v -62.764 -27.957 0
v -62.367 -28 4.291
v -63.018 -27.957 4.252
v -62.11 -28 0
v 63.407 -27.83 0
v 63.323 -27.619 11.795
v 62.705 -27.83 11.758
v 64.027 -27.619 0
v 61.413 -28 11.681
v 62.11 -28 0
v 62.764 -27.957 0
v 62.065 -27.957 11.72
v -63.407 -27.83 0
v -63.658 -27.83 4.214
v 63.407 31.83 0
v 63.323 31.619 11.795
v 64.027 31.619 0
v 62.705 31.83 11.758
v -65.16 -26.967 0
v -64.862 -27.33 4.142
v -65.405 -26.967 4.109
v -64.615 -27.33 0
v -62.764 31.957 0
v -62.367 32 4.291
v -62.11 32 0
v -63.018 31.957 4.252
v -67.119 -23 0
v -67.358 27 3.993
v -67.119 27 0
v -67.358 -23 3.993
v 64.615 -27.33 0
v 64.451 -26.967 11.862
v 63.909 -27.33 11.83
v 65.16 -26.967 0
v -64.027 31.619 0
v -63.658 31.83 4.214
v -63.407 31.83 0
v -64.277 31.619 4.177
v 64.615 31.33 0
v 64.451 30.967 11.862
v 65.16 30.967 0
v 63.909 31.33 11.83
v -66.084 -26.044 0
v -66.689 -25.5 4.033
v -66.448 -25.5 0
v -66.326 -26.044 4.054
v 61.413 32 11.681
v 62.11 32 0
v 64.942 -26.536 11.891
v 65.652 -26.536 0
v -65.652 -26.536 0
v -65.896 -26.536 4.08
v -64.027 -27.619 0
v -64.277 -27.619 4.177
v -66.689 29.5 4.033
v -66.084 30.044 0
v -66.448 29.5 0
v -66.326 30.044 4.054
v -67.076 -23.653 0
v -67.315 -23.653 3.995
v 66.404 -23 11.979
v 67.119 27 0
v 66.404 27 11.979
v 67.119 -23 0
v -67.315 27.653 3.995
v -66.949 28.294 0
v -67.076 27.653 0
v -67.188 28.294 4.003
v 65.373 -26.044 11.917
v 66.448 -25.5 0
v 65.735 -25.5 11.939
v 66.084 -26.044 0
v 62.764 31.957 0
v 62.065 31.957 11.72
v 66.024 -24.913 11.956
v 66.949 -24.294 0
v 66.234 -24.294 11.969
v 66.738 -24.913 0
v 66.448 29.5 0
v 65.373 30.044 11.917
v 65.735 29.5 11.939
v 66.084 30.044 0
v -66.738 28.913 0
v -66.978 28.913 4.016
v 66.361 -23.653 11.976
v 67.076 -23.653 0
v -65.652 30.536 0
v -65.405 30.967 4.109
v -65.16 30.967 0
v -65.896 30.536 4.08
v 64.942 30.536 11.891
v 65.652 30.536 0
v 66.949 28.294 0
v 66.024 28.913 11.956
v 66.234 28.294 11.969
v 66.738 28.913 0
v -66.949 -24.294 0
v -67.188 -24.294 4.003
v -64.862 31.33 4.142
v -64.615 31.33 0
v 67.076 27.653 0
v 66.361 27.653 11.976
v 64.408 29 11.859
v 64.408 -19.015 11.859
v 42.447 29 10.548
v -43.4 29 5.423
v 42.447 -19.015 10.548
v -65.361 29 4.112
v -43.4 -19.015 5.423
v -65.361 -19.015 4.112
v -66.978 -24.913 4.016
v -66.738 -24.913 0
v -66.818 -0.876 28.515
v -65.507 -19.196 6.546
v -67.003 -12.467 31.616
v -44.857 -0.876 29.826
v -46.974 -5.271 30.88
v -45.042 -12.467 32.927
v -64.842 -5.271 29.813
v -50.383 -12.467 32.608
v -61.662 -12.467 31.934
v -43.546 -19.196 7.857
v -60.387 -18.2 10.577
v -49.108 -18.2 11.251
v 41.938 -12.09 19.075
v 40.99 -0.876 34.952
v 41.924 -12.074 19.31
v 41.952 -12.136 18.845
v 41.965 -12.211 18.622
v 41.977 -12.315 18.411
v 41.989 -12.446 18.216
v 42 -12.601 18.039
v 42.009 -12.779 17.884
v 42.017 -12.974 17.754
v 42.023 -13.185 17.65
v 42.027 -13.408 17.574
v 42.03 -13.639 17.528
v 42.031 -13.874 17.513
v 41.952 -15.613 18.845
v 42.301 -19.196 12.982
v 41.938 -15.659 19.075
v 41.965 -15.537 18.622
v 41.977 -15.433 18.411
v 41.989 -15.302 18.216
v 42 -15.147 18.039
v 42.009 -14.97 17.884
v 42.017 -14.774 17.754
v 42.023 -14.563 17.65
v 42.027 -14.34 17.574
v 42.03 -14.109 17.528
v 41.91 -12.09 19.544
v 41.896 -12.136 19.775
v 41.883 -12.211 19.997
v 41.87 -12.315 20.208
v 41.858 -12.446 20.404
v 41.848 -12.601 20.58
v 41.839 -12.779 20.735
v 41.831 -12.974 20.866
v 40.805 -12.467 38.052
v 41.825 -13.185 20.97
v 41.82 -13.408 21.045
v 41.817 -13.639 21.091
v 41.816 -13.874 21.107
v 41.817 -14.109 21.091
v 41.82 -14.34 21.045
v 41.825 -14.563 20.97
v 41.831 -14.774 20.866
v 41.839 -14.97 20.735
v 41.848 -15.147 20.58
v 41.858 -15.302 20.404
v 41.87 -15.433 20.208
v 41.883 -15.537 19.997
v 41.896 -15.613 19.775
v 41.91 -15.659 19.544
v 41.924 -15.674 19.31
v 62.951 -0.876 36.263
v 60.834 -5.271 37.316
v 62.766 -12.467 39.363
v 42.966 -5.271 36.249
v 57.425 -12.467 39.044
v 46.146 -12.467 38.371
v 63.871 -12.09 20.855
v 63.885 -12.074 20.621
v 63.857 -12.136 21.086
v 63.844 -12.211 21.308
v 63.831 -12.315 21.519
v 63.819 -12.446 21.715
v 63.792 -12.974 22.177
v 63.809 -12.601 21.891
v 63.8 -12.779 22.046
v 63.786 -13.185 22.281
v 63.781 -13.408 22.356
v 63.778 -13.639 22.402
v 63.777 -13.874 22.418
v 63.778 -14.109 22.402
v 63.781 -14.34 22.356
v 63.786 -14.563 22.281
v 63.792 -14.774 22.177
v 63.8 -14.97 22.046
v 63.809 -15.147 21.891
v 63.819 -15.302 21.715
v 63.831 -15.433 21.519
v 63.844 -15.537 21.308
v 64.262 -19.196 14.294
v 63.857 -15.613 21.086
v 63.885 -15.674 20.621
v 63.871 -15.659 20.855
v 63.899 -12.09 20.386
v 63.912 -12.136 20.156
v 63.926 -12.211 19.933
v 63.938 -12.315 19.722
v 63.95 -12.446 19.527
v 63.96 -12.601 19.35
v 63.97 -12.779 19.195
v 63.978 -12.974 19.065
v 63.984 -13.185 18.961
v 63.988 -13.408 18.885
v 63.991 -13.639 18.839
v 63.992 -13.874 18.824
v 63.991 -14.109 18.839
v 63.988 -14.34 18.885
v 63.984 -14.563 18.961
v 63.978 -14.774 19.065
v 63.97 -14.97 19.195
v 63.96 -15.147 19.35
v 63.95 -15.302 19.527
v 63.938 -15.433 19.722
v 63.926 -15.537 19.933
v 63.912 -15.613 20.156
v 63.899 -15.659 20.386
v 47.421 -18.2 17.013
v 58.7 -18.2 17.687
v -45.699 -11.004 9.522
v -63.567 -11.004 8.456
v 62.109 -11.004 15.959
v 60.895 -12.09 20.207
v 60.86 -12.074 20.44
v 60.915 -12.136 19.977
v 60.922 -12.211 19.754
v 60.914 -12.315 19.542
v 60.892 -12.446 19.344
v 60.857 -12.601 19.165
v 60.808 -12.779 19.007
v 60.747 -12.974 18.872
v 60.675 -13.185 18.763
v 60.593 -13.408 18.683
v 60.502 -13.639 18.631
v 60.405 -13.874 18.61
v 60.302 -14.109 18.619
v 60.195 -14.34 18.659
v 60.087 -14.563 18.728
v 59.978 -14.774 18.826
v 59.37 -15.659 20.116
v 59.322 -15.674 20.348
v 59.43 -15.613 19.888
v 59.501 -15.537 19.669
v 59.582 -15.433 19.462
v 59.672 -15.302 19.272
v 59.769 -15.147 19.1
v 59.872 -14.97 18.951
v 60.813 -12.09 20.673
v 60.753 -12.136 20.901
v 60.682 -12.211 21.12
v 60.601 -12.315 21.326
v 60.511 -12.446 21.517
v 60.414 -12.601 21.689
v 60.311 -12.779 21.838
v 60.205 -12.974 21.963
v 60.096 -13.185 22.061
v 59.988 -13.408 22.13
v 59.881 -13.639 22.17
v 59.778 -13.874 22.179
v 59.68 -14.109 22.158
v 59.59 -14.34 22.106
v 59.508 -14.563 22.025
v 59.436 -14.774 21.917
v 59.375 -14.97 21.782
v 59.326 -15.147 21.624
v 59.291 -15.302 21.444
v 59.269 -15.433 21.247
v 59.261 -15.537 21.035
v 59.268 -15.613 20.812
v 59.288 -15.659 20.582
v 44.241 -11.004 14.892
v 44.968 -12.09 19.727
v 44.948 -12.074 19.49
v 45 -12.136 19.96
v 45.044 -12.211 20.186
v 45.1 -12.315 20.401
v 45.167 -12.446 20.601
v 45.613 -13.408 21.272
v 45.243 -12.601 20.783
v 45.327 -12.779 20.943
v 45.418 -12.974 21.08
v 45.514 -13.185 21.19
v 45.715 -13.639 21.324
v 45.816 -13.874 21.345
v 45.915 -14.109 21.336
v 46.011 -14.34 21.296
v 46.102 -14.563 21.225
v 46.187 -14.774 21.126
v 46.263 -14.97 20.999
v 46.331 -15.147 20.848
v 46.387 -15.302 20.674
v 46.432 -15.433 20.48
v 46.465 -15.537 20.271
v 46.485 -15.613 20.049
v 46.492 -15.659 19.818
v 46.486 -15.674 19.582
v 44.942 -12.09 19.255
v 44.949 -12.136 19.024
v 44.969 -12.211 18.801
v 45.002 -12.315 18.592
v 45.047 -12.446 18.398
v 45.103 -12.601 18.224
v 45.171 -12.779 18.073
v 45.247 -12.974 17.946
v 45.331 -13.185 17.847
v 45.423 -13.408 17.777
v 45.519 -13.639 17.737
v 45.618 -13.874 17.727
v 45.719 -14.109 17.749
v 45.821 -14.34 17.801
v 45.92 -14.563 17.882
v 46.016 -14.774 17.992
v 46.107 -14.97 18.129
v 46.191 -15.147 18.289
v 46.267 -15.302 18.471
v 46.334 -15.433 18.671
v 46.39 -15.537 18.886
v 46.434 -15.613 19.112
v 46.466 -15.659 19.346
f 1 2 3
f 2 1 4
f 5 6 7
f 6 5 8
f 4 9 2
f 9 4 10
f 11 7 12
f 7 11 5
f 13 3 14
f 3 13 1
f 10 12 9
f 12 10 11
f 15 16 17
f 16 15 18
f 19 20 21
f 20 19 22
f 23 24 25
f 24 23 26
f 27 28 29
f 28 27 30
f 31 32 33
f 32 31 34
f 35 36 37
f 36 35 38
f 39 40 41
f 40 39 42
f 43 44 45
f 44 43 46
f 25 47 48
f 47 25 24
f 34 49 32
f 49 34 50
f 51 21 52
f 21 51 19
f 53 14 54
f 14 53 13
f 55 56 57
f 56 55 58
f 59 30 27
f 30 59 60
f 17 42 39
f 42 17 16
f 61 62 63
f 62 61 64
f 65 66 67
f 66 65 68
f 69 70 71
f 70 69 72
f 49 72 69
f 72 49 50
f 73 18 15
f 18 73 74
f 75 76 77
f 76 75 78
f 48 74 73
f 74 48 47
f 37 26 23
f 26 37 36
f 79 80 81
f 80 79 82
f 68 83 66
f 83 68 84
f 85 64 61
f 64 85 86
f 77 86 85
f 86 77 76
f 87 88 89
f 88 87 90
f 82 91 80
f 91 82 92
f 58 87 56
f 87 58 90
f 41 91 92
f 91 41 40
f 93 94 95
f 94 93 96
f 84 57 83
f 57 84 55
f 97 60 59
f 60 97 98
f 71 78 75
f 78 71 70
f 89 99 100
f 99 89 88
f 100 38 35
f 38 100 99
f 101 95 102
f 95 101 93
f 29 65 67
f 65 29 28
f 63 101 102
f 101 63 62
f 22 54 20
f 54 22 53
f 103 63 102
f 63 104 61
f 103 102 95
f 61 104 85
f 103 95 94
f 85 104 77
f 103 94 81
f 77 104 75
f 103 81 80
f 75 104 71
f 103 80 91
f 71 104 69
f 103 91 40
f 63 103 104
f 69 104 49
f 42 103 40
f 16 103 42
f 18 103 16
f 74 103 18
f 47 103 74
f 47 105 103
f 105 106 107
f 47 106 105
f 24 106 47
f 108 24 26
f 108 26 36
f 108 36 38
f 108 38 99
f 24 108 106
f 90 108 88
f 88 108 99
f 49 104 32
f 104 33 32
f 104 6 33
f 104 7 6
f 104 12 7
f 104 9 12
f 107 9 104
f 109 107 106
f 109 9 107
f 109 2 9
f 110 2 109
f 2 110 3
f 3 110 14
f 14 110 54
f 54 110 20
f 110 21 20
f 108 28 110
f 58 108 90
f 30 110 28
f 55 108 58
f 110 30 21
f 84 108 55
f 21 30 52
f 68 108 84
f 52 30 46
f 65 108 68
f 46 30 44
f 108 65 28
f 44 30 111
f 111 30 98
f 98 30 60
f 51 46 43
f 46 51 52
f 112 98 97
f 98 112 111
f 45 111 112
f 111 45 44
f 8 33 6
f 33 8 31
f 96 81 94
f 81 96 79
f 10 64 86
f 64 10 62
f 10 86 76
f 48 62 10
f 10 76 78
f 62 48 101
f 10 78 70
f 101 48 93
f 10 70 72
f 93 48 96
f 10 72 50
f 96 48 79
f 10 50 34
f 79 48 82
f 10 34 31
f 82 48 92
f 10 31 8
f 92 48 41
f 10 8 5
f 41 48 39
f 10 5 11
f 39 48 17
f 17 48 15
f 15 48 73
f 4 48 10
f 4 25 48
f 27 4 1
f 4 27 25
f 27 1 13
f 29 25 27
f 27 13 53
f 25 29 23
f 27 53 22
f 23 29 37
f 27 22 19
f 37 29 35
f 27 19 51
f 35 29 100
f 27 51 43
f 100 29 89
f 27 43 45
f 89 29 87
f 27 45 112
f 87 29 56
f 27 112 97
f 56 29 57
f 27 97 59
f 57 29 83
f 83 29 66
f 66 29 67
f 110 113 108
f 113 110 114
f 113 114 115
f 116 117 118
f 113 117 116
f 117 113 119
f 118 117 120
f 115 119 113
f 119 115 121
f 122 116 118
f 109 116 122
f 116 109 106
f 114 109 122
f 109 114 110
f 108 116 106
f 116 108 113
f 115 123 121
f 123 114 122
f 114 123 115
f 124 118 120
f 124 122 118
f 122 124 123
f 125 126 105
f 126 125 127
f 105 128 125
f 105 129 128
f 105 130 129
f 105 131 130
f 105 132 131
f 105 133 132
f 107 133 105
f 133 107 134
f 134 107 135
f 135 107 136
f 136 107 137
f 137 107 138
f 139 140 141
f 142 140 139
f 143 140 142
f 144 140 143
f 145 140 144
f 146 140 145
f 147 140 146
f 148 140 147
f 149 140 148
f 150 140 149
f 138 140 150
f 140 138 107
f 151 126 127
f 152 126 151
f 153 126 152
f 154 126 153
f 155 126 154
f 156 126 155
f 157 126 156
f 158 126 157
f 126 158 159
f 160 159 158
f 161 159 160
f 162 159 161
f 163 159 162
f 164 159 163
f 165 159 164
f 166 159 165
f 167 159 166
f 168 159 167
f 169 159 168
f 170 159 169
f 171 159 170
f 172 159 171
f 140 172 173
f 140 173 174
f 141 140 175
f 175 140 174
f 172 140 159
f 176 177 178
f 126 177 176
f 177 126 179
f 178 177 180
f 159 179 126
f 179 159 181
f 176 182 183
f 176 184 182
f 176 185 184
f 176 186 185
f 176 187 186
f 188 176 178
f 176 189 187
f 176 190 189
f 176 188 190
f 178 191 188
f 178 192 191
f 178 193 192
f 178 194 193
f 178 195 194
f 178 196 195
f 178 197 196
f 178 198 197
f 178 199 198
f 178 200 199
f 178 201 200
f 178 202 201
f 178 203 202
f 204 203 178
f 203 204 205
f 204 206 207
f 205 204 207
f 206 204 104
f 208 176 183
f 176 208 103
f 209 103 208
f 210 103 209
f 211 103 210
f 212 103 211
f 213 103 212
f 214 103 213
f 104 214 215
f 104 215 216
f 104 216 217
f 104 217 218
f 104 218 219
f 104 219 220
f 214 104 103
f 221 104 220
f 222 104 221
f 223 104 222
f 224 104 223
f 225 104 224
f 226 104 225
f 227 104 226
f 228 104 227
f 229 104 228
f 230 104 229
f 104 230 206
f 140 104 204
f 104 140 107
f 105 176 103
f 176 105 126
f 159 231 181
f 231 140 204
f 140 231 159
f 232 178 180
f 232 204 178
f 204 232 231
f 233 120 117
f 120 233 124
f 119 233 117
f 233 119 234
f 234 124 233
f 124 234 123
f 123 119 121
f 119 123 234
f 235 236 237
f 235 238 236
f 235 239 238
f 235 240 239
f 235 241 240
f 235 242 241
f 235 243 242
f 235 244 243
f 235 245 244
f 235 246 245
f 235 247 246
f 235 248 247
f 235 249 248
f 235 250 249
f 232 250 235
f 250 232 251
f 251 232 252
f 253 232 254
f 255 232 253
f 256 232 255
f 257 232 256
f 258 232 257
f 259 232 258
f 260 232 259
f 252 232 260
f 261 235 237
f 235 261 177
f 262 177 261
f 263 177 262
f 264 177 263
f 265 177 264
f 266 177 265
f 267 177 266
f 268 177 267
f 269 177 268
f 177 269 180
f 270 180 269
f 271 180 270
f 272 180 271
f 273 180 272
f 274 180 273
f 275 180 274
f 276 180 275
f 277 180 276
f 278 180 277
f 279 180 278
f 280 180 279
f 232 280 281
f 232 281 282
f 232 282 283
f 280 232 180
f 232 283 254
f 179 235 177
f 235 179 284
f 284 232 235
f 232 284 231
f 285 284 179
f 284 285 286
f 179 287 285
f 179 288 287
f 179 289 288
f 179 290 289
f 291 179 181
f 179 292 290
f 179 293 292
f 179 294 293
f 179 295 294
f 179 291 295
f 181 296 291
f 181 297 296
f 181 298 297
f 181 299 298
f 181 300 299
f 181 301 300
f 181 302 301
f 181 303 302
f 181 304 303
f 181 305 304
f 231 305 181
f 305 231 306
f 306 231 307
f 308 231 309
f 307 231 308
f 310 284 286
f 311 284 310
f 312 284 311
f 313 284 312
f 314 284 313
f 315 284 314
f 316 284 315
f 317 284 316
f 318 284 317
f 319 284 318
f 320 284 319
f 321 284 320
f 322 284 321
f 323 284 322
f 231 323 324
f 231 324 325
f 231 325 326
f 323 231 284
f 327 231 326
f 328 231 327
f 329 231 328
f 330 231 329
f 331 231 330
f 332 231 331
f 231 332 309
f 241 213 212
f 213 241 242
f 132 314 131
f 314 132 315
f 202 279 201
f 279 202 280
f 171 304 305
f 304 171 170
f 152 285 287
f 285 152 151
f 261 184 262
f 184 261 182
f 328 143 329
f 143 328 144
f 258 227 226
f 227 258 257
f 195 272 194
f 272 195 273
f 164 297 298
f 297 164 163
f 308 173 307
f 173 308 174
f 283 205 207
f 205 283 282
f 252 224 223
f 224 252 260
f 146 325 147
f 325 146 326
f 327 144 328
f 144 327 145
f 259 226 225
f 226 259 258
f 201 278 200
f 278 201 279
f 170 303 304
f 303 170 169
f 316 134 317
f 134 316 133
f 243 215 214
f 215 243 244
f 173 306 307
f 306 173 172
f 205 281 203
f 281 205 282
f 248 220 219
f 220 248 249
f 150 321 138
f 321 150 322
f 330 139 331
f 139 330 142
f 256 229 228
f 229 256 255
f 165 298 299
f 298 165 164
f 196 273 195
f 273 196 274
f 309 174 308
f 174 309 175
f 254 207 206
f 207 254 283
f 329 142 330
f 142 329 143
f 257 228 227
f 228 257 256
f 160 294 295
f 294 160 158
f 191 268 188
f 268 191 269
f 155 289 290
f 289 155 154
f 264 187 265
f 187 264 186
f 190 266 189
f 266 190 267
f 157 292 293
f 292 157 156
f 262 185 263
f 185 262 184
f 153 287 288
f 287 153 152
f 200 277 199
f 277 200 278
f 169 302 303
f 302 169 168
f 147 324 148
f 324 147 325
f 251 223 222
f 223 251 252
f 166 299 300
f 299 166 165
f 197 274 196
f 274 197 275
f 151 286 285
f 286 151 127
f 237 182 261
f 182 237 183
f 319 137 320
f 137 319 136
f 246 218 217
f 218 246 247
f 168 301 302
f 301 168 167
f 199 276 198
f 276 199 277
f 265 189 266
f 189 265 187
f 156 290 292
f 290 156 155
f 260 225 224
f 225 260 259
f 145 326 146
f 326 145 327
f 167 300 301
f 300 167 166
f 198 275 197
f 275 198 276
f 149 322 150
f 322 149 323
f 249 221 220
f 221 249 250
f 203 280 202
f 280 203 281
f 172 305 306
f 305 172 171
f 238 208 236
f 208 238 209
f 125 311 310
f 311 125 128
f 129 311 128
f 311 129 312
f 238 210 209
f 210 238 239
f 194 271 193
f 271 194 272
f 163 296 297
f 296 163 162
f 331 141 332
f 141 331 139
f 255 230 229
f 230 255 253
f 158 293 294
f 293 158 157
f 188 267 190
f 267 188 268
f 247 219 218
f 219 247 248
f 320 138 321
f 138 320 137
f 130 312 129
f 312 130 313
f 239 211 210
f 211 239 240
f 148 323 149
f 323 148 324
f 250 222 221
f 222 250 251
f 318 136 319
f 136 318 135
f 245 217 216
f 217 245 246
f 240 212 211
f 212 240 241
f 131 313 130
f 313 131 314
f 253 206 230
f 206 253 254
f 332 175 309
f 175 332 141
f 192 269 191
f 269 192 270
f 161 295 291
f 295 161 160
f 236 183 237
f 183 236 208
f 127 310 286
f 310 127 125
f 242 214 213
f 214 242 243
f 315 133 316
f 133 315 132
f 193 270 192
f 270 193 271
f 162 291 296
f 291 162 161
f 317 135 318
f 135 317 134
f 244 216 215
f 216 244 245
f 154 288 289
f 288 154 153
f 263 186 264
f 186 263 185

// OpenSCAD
// PH-1 HUD mount: dock, slider, tray and front frame.
// USB-C faces +X. Dimensions are in millimeters.
part = "quick_dock"; // [quick_dock, slider, tray, frame, quick_assembly]
lean_back = 15;
dash_drop_right = 8;

phone_length = 141.5;
phone_width = 71.1;
phone_thickness = 7.8;
bay_length = phone_length + 0.9;
bay_width = phone_width + 1.0;
face_clearance = 0.6;
end_overlap = 2.5;
usb_width = 24;
base_thickness = 4.6;
frame_thickness = 3.2;
frame_z = base_thickness + phone_thickness + face_clearance;

outer_length = 163;
outer_width = 83;
frame_bolt_x = 76.5;
frame_bolt_y = 36.5;
foot_bolt_x = 54;
foot_bolt_y = -25;
m3_clearance = 3.4;
nut_width = 6.0; // Across flats, including print clearance.
nut_entry_width = 6.4;
nut_entry_depth = 0.45;
nut_depth = 2.8;
eps = 0.02;
$fn = 48;

module outline() {
    offset(r = 4) square([outer_length - 8, outer_width - 8], center = true);
}

module usb_notch() {
    translate([phone_length / 2 - 5, -usb_width / 2])
        square([outer_length / 2 - phone_length / 2 + 6, usb_width]);
}

module frame_bolts() {
    for (x = [-frame_bolt_x, frame_bolt_x], y = [-frame_bolt_y, frame_bolt_y])
        translate([x, y, 0]) children();
}

module foot_bolts() {
    for (x = [-foot_bolt_x, foot_bolt_x])
        translate([x, foot_bolt_y, 0]) children();
}

// The pocket opens at Z=0 and cuts inward along +Z.
module nut_pocket() {
    translate([0, 0, -eps]) {
        cylinder(h = nut_depth + eps, r = nut_width / sqrt(3), $fn = 6);
        cylinder(h = nut_entry_depth + eps, r1 = nut_entry_width / sqrt(3),
            r2 = nut_width / sqrt(3), $fn = 6);
    }
}

module tray() {
    difference() {
        union() {
            linear_extrude(base_thickness)
                difference() {
                    outline();
                    offset(r = 4) square([100, 31], center = true);
                }

            // End stops and short corner guides leave the side buttons open.
            translate([0, 0, base_thickness - eps])
                linear_extrude(frame_z - base_thickness + eps)
                    difference() {
                        intersection() {
                            outline();
                            for_end_guides();
                        }
                        square([bay_length, bay_width], center = true);
                    }
        }

        translate([0, 0, -eps]) linear_extrude(frame_z + 2 * eps) usb_notch();

        frame_bolts() {
            translate([0, 0, -eps]) cylinder(h = frame_z + 2 * eps, d = m3_clearance);
            nut_pocket();
        }

        foot_bolts() {
            translate([0, 0, -eps]) cylinder(h = base_thickness + 2 * eps, d = m3_clearance);
            // Heads sit below the phone's rear surface.
            translate([0, 0, base_thickness - 2.7]) cylinder(h = 2.7 + eps, d = 6.2);
        }
    }
}

module for_end_guides() {
    for (side = [-1, 1])
        translate([side * 73, 0]) square([24, outer_width + 2], center = true);
}

module frame() {
    linear_extrude(frame_thickness)
        difference() {
            outline();
            // The aperture clears the long edges and captures the short bezels.
            square([phone_length - 2 * end_overlap, bay_width + 2.6], center = true);
            usb_notch();
            frame_bolts() circle(d = m3_clearance);
        }
}

slider_low = -35;
slider_high = -17;
slider_plate = 3;
slider_depth = 10;
slide_clearance = 0.45;
pin_y = -31.5;
pin_z = 6.5;
pin_bore = 3.6;

// Positive Z points away from the tray in the slider's print orientation.
module dovetail(x, start, end, clearance = 0) {
    translate([x, end, 0]) rotate([90, 0, 0])
        linear_extrude(end - start)
            polygon([
                [-5 - clearance, slider_plate - clearance],
                [5 + clearance, slider_plate - clearance],
                [8.5 + clearance, slider_depth + clearance],
                [-8.5 - clearance, slider_depth + clearance]
            ]);
}

module pin_hole() {
    translate([foot_bolt_x - 13, pin_y, pin_z])
        rotate([0, 90, 0]) cylinder(h = 26, d = pin_bore);
}

module slider() {
    difference() {
        union() {
            translate([-65, slider_low, 0])
                cube([130, slider_high - slider_low, slider_plate]);
            for (x = [-foot_bolt_x, foot_bolt_x])
                translate([0, 0, -eps]) dovetail(x, slider_low, slider_high);
        }
        foot_bolts() {
            translate([0, 0, -eps]) cylinder(h = slider_depth + 2 * eps, d = m3_clearance);
            translate([0, 0, slider_depth]) mirror([0, 0, 1]) nut_pocket();
        }
        pin_hole();
    }
}

foot_width = 134;
sole_angle = atan(dash_drop_right / foot_width);

module cradle_pose() {
    angle = 90 - lean_back;
    translate([0, -12, 4.8 + sin(angle) * outer_width / 2])
        rotate([angle, 0, 0]) children();
}

module sole() {
    intersection() {
        translate([0, 2, -dash_drop_right - eps])
            linear_extrude(4 + dash_drop_right + eps)
                offset(r = 5) square([foot_width - 10, 50], center = true);

        // Keep the top level with the cradle while matching the dash below.
        translate([0, 0, -dash_drop_right / 2])
            rotate([0, sole_angle, 0])
                translate([-foot_width, -80, 0])
                    cube([2 * foot_width, 160, 50]);
    }
}

module quick_dock() {
    rib_front = max(-19, -12 - sin(lean_back) * outer_width / 2 + 3);
    difference() {
        union() {
            sole();
            for (x = [-foot_bolt_x, foot_bolt_x])
                hull() {
                    translate([x - 11, rib_front, 3.8]) cube([22, 29 - rib_front, 0.2]);
                    cradle_pose()
                        translate([x - 11, -39, -15]) cube([22, 26, 12]);
                }
        }
        cradle_pose() mirror([0, 0, 1]) {
            for (x = [-foot_bolt_x, foot_bolt_x])
                dovetail(x, slider_low - 0.15, 40, slide_clearance);
            pin_hole();
        }
    }
}

module printable_quick_dock() {
    rotate([0, -sole_angle, 0])
        translate([0, 0, dash_drop_right / 2]) quick_dock();
}

if (part == "quick_dock") printable_quick_dock();
if (part == "slider") slider();
if (part == "tray") tray();
if (part == "frame") frame();
if (part == "quick_assembly") {
    color("#4b5563") quick_dock();
    cradle_pose() {
        color("#21988c") mirror([0, 0, 1]) slider();
        color("#374151") tray();
        color("#101820")
            translate([-phone_length / 2, -phone_width / 2, base_thickness])
                cube([phone_length, phone_width, phone_thickness]);
        color("#8298a8") translate([0, 0, frame_z]) frame();
    }
}
